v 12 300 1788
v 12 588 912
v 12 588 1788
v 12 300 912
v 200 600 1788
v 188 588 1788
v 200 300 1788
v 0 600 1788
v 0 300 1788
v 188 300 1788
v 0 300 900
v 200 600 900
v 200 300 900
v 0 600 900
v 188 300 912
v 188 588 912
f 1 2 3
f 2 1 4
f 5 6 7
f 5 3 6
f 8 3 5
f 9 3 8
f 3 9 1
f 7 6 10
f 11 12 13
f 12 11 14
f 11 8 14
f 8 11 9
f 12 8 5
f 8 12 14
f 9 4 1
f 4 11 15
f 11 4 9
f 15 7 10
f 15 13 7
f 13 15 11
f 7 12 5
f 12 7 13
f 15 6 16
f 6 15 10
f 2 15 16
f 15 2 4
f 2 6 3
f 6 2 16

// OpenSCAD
// file: cabinet.scad
/*

    Cabinet
    
    By Anton Augustsson


*/

module cabinet (
    thickness,
    length,
    width,
    height
    ){
/*
    ---------- Local varibles ---------- 
*/



/*
    ---------- Code ---------- 
*/


union () {

// Left
translate([
    0,
    0,
    0]) 
cube(size = [
    thickness,
    width,
    height-thickness]);

// Right
translate([
    length-thickness,
    0,
    0]) 
cube(size = [
    thickness,
    width,
    height-thickness]);
    
// Bottom 
translate([
    thickness,
    0,
    0]) 
cube(size = [
    length
    -thickness*2,
    width-thickness,
    thickness]);

// Back
translate([
    thickness,
    width-thickness,
    0]) 
cube(size = [
    length
    -thickness*2,
    thickness,
    height-thickness]);
}}



/*
    ---------- Example ---------- 
*/


thickness = 12;

length = 600;
width  = 600;
height = 900;

cabinet (
    thickness,
    length,
    width,
    height
    );
// main file
/*

    Tird Section Left Cabinet
    
    By Anton Augustsson


*/

use <cabinet.scad>;

module tirdSectionLeftCabinet (
    plywoodThickness,
    lengthMiddleSection,
    lengthSecondSection,
    length,
    widthCabinet,
    widthCabinetDoor,
    widthTable,
    width,
    heightTable,
    heightCabinet,
    x,y,z
    ){

/*
    ---------- Local varibles ---------- 
*/

thickness = plywoodThickness;

length = lengthTirdSection;
width  = widthCabinet;
height = heightCabinet;


/*
    ---------- Code ---------- 
*/


translate([
	x,
	y,
	z,])

union () {

cabinet (
    thickness,
    length,
    width,
    height
    );
    
}}



/*
    ---------- Example ---------- 
*/


plywoodThickness = 12;

lengthMiddleSection = 600;
lengthSecondSection = lengthMiddleSection/2;
lengthTirdSection   = 200;
length=lengthMiddleSection
    +lengthSecondSection*2
    +lengthTirdSection*2;

widthCabinet     = 300;
widthCabinetDoor = widthCabinet/3;
widthTable       = 300;
width            = widthCabinet+widthTable;

heightTable   = 900;
heightCabinet = 900;


x=0;
y=width-widthCabinet;
z=heightTable;

tirdSectionLeftCabinet (
    plywoodThickness,
    lengthMiddleSection,
    lengthSecondSection,
    length,
    widthCabinet,
    widthCabinetDoor,
    widthTable,
    width,
    heightTable,
    heightCabinet,
    x,y,z
    );
